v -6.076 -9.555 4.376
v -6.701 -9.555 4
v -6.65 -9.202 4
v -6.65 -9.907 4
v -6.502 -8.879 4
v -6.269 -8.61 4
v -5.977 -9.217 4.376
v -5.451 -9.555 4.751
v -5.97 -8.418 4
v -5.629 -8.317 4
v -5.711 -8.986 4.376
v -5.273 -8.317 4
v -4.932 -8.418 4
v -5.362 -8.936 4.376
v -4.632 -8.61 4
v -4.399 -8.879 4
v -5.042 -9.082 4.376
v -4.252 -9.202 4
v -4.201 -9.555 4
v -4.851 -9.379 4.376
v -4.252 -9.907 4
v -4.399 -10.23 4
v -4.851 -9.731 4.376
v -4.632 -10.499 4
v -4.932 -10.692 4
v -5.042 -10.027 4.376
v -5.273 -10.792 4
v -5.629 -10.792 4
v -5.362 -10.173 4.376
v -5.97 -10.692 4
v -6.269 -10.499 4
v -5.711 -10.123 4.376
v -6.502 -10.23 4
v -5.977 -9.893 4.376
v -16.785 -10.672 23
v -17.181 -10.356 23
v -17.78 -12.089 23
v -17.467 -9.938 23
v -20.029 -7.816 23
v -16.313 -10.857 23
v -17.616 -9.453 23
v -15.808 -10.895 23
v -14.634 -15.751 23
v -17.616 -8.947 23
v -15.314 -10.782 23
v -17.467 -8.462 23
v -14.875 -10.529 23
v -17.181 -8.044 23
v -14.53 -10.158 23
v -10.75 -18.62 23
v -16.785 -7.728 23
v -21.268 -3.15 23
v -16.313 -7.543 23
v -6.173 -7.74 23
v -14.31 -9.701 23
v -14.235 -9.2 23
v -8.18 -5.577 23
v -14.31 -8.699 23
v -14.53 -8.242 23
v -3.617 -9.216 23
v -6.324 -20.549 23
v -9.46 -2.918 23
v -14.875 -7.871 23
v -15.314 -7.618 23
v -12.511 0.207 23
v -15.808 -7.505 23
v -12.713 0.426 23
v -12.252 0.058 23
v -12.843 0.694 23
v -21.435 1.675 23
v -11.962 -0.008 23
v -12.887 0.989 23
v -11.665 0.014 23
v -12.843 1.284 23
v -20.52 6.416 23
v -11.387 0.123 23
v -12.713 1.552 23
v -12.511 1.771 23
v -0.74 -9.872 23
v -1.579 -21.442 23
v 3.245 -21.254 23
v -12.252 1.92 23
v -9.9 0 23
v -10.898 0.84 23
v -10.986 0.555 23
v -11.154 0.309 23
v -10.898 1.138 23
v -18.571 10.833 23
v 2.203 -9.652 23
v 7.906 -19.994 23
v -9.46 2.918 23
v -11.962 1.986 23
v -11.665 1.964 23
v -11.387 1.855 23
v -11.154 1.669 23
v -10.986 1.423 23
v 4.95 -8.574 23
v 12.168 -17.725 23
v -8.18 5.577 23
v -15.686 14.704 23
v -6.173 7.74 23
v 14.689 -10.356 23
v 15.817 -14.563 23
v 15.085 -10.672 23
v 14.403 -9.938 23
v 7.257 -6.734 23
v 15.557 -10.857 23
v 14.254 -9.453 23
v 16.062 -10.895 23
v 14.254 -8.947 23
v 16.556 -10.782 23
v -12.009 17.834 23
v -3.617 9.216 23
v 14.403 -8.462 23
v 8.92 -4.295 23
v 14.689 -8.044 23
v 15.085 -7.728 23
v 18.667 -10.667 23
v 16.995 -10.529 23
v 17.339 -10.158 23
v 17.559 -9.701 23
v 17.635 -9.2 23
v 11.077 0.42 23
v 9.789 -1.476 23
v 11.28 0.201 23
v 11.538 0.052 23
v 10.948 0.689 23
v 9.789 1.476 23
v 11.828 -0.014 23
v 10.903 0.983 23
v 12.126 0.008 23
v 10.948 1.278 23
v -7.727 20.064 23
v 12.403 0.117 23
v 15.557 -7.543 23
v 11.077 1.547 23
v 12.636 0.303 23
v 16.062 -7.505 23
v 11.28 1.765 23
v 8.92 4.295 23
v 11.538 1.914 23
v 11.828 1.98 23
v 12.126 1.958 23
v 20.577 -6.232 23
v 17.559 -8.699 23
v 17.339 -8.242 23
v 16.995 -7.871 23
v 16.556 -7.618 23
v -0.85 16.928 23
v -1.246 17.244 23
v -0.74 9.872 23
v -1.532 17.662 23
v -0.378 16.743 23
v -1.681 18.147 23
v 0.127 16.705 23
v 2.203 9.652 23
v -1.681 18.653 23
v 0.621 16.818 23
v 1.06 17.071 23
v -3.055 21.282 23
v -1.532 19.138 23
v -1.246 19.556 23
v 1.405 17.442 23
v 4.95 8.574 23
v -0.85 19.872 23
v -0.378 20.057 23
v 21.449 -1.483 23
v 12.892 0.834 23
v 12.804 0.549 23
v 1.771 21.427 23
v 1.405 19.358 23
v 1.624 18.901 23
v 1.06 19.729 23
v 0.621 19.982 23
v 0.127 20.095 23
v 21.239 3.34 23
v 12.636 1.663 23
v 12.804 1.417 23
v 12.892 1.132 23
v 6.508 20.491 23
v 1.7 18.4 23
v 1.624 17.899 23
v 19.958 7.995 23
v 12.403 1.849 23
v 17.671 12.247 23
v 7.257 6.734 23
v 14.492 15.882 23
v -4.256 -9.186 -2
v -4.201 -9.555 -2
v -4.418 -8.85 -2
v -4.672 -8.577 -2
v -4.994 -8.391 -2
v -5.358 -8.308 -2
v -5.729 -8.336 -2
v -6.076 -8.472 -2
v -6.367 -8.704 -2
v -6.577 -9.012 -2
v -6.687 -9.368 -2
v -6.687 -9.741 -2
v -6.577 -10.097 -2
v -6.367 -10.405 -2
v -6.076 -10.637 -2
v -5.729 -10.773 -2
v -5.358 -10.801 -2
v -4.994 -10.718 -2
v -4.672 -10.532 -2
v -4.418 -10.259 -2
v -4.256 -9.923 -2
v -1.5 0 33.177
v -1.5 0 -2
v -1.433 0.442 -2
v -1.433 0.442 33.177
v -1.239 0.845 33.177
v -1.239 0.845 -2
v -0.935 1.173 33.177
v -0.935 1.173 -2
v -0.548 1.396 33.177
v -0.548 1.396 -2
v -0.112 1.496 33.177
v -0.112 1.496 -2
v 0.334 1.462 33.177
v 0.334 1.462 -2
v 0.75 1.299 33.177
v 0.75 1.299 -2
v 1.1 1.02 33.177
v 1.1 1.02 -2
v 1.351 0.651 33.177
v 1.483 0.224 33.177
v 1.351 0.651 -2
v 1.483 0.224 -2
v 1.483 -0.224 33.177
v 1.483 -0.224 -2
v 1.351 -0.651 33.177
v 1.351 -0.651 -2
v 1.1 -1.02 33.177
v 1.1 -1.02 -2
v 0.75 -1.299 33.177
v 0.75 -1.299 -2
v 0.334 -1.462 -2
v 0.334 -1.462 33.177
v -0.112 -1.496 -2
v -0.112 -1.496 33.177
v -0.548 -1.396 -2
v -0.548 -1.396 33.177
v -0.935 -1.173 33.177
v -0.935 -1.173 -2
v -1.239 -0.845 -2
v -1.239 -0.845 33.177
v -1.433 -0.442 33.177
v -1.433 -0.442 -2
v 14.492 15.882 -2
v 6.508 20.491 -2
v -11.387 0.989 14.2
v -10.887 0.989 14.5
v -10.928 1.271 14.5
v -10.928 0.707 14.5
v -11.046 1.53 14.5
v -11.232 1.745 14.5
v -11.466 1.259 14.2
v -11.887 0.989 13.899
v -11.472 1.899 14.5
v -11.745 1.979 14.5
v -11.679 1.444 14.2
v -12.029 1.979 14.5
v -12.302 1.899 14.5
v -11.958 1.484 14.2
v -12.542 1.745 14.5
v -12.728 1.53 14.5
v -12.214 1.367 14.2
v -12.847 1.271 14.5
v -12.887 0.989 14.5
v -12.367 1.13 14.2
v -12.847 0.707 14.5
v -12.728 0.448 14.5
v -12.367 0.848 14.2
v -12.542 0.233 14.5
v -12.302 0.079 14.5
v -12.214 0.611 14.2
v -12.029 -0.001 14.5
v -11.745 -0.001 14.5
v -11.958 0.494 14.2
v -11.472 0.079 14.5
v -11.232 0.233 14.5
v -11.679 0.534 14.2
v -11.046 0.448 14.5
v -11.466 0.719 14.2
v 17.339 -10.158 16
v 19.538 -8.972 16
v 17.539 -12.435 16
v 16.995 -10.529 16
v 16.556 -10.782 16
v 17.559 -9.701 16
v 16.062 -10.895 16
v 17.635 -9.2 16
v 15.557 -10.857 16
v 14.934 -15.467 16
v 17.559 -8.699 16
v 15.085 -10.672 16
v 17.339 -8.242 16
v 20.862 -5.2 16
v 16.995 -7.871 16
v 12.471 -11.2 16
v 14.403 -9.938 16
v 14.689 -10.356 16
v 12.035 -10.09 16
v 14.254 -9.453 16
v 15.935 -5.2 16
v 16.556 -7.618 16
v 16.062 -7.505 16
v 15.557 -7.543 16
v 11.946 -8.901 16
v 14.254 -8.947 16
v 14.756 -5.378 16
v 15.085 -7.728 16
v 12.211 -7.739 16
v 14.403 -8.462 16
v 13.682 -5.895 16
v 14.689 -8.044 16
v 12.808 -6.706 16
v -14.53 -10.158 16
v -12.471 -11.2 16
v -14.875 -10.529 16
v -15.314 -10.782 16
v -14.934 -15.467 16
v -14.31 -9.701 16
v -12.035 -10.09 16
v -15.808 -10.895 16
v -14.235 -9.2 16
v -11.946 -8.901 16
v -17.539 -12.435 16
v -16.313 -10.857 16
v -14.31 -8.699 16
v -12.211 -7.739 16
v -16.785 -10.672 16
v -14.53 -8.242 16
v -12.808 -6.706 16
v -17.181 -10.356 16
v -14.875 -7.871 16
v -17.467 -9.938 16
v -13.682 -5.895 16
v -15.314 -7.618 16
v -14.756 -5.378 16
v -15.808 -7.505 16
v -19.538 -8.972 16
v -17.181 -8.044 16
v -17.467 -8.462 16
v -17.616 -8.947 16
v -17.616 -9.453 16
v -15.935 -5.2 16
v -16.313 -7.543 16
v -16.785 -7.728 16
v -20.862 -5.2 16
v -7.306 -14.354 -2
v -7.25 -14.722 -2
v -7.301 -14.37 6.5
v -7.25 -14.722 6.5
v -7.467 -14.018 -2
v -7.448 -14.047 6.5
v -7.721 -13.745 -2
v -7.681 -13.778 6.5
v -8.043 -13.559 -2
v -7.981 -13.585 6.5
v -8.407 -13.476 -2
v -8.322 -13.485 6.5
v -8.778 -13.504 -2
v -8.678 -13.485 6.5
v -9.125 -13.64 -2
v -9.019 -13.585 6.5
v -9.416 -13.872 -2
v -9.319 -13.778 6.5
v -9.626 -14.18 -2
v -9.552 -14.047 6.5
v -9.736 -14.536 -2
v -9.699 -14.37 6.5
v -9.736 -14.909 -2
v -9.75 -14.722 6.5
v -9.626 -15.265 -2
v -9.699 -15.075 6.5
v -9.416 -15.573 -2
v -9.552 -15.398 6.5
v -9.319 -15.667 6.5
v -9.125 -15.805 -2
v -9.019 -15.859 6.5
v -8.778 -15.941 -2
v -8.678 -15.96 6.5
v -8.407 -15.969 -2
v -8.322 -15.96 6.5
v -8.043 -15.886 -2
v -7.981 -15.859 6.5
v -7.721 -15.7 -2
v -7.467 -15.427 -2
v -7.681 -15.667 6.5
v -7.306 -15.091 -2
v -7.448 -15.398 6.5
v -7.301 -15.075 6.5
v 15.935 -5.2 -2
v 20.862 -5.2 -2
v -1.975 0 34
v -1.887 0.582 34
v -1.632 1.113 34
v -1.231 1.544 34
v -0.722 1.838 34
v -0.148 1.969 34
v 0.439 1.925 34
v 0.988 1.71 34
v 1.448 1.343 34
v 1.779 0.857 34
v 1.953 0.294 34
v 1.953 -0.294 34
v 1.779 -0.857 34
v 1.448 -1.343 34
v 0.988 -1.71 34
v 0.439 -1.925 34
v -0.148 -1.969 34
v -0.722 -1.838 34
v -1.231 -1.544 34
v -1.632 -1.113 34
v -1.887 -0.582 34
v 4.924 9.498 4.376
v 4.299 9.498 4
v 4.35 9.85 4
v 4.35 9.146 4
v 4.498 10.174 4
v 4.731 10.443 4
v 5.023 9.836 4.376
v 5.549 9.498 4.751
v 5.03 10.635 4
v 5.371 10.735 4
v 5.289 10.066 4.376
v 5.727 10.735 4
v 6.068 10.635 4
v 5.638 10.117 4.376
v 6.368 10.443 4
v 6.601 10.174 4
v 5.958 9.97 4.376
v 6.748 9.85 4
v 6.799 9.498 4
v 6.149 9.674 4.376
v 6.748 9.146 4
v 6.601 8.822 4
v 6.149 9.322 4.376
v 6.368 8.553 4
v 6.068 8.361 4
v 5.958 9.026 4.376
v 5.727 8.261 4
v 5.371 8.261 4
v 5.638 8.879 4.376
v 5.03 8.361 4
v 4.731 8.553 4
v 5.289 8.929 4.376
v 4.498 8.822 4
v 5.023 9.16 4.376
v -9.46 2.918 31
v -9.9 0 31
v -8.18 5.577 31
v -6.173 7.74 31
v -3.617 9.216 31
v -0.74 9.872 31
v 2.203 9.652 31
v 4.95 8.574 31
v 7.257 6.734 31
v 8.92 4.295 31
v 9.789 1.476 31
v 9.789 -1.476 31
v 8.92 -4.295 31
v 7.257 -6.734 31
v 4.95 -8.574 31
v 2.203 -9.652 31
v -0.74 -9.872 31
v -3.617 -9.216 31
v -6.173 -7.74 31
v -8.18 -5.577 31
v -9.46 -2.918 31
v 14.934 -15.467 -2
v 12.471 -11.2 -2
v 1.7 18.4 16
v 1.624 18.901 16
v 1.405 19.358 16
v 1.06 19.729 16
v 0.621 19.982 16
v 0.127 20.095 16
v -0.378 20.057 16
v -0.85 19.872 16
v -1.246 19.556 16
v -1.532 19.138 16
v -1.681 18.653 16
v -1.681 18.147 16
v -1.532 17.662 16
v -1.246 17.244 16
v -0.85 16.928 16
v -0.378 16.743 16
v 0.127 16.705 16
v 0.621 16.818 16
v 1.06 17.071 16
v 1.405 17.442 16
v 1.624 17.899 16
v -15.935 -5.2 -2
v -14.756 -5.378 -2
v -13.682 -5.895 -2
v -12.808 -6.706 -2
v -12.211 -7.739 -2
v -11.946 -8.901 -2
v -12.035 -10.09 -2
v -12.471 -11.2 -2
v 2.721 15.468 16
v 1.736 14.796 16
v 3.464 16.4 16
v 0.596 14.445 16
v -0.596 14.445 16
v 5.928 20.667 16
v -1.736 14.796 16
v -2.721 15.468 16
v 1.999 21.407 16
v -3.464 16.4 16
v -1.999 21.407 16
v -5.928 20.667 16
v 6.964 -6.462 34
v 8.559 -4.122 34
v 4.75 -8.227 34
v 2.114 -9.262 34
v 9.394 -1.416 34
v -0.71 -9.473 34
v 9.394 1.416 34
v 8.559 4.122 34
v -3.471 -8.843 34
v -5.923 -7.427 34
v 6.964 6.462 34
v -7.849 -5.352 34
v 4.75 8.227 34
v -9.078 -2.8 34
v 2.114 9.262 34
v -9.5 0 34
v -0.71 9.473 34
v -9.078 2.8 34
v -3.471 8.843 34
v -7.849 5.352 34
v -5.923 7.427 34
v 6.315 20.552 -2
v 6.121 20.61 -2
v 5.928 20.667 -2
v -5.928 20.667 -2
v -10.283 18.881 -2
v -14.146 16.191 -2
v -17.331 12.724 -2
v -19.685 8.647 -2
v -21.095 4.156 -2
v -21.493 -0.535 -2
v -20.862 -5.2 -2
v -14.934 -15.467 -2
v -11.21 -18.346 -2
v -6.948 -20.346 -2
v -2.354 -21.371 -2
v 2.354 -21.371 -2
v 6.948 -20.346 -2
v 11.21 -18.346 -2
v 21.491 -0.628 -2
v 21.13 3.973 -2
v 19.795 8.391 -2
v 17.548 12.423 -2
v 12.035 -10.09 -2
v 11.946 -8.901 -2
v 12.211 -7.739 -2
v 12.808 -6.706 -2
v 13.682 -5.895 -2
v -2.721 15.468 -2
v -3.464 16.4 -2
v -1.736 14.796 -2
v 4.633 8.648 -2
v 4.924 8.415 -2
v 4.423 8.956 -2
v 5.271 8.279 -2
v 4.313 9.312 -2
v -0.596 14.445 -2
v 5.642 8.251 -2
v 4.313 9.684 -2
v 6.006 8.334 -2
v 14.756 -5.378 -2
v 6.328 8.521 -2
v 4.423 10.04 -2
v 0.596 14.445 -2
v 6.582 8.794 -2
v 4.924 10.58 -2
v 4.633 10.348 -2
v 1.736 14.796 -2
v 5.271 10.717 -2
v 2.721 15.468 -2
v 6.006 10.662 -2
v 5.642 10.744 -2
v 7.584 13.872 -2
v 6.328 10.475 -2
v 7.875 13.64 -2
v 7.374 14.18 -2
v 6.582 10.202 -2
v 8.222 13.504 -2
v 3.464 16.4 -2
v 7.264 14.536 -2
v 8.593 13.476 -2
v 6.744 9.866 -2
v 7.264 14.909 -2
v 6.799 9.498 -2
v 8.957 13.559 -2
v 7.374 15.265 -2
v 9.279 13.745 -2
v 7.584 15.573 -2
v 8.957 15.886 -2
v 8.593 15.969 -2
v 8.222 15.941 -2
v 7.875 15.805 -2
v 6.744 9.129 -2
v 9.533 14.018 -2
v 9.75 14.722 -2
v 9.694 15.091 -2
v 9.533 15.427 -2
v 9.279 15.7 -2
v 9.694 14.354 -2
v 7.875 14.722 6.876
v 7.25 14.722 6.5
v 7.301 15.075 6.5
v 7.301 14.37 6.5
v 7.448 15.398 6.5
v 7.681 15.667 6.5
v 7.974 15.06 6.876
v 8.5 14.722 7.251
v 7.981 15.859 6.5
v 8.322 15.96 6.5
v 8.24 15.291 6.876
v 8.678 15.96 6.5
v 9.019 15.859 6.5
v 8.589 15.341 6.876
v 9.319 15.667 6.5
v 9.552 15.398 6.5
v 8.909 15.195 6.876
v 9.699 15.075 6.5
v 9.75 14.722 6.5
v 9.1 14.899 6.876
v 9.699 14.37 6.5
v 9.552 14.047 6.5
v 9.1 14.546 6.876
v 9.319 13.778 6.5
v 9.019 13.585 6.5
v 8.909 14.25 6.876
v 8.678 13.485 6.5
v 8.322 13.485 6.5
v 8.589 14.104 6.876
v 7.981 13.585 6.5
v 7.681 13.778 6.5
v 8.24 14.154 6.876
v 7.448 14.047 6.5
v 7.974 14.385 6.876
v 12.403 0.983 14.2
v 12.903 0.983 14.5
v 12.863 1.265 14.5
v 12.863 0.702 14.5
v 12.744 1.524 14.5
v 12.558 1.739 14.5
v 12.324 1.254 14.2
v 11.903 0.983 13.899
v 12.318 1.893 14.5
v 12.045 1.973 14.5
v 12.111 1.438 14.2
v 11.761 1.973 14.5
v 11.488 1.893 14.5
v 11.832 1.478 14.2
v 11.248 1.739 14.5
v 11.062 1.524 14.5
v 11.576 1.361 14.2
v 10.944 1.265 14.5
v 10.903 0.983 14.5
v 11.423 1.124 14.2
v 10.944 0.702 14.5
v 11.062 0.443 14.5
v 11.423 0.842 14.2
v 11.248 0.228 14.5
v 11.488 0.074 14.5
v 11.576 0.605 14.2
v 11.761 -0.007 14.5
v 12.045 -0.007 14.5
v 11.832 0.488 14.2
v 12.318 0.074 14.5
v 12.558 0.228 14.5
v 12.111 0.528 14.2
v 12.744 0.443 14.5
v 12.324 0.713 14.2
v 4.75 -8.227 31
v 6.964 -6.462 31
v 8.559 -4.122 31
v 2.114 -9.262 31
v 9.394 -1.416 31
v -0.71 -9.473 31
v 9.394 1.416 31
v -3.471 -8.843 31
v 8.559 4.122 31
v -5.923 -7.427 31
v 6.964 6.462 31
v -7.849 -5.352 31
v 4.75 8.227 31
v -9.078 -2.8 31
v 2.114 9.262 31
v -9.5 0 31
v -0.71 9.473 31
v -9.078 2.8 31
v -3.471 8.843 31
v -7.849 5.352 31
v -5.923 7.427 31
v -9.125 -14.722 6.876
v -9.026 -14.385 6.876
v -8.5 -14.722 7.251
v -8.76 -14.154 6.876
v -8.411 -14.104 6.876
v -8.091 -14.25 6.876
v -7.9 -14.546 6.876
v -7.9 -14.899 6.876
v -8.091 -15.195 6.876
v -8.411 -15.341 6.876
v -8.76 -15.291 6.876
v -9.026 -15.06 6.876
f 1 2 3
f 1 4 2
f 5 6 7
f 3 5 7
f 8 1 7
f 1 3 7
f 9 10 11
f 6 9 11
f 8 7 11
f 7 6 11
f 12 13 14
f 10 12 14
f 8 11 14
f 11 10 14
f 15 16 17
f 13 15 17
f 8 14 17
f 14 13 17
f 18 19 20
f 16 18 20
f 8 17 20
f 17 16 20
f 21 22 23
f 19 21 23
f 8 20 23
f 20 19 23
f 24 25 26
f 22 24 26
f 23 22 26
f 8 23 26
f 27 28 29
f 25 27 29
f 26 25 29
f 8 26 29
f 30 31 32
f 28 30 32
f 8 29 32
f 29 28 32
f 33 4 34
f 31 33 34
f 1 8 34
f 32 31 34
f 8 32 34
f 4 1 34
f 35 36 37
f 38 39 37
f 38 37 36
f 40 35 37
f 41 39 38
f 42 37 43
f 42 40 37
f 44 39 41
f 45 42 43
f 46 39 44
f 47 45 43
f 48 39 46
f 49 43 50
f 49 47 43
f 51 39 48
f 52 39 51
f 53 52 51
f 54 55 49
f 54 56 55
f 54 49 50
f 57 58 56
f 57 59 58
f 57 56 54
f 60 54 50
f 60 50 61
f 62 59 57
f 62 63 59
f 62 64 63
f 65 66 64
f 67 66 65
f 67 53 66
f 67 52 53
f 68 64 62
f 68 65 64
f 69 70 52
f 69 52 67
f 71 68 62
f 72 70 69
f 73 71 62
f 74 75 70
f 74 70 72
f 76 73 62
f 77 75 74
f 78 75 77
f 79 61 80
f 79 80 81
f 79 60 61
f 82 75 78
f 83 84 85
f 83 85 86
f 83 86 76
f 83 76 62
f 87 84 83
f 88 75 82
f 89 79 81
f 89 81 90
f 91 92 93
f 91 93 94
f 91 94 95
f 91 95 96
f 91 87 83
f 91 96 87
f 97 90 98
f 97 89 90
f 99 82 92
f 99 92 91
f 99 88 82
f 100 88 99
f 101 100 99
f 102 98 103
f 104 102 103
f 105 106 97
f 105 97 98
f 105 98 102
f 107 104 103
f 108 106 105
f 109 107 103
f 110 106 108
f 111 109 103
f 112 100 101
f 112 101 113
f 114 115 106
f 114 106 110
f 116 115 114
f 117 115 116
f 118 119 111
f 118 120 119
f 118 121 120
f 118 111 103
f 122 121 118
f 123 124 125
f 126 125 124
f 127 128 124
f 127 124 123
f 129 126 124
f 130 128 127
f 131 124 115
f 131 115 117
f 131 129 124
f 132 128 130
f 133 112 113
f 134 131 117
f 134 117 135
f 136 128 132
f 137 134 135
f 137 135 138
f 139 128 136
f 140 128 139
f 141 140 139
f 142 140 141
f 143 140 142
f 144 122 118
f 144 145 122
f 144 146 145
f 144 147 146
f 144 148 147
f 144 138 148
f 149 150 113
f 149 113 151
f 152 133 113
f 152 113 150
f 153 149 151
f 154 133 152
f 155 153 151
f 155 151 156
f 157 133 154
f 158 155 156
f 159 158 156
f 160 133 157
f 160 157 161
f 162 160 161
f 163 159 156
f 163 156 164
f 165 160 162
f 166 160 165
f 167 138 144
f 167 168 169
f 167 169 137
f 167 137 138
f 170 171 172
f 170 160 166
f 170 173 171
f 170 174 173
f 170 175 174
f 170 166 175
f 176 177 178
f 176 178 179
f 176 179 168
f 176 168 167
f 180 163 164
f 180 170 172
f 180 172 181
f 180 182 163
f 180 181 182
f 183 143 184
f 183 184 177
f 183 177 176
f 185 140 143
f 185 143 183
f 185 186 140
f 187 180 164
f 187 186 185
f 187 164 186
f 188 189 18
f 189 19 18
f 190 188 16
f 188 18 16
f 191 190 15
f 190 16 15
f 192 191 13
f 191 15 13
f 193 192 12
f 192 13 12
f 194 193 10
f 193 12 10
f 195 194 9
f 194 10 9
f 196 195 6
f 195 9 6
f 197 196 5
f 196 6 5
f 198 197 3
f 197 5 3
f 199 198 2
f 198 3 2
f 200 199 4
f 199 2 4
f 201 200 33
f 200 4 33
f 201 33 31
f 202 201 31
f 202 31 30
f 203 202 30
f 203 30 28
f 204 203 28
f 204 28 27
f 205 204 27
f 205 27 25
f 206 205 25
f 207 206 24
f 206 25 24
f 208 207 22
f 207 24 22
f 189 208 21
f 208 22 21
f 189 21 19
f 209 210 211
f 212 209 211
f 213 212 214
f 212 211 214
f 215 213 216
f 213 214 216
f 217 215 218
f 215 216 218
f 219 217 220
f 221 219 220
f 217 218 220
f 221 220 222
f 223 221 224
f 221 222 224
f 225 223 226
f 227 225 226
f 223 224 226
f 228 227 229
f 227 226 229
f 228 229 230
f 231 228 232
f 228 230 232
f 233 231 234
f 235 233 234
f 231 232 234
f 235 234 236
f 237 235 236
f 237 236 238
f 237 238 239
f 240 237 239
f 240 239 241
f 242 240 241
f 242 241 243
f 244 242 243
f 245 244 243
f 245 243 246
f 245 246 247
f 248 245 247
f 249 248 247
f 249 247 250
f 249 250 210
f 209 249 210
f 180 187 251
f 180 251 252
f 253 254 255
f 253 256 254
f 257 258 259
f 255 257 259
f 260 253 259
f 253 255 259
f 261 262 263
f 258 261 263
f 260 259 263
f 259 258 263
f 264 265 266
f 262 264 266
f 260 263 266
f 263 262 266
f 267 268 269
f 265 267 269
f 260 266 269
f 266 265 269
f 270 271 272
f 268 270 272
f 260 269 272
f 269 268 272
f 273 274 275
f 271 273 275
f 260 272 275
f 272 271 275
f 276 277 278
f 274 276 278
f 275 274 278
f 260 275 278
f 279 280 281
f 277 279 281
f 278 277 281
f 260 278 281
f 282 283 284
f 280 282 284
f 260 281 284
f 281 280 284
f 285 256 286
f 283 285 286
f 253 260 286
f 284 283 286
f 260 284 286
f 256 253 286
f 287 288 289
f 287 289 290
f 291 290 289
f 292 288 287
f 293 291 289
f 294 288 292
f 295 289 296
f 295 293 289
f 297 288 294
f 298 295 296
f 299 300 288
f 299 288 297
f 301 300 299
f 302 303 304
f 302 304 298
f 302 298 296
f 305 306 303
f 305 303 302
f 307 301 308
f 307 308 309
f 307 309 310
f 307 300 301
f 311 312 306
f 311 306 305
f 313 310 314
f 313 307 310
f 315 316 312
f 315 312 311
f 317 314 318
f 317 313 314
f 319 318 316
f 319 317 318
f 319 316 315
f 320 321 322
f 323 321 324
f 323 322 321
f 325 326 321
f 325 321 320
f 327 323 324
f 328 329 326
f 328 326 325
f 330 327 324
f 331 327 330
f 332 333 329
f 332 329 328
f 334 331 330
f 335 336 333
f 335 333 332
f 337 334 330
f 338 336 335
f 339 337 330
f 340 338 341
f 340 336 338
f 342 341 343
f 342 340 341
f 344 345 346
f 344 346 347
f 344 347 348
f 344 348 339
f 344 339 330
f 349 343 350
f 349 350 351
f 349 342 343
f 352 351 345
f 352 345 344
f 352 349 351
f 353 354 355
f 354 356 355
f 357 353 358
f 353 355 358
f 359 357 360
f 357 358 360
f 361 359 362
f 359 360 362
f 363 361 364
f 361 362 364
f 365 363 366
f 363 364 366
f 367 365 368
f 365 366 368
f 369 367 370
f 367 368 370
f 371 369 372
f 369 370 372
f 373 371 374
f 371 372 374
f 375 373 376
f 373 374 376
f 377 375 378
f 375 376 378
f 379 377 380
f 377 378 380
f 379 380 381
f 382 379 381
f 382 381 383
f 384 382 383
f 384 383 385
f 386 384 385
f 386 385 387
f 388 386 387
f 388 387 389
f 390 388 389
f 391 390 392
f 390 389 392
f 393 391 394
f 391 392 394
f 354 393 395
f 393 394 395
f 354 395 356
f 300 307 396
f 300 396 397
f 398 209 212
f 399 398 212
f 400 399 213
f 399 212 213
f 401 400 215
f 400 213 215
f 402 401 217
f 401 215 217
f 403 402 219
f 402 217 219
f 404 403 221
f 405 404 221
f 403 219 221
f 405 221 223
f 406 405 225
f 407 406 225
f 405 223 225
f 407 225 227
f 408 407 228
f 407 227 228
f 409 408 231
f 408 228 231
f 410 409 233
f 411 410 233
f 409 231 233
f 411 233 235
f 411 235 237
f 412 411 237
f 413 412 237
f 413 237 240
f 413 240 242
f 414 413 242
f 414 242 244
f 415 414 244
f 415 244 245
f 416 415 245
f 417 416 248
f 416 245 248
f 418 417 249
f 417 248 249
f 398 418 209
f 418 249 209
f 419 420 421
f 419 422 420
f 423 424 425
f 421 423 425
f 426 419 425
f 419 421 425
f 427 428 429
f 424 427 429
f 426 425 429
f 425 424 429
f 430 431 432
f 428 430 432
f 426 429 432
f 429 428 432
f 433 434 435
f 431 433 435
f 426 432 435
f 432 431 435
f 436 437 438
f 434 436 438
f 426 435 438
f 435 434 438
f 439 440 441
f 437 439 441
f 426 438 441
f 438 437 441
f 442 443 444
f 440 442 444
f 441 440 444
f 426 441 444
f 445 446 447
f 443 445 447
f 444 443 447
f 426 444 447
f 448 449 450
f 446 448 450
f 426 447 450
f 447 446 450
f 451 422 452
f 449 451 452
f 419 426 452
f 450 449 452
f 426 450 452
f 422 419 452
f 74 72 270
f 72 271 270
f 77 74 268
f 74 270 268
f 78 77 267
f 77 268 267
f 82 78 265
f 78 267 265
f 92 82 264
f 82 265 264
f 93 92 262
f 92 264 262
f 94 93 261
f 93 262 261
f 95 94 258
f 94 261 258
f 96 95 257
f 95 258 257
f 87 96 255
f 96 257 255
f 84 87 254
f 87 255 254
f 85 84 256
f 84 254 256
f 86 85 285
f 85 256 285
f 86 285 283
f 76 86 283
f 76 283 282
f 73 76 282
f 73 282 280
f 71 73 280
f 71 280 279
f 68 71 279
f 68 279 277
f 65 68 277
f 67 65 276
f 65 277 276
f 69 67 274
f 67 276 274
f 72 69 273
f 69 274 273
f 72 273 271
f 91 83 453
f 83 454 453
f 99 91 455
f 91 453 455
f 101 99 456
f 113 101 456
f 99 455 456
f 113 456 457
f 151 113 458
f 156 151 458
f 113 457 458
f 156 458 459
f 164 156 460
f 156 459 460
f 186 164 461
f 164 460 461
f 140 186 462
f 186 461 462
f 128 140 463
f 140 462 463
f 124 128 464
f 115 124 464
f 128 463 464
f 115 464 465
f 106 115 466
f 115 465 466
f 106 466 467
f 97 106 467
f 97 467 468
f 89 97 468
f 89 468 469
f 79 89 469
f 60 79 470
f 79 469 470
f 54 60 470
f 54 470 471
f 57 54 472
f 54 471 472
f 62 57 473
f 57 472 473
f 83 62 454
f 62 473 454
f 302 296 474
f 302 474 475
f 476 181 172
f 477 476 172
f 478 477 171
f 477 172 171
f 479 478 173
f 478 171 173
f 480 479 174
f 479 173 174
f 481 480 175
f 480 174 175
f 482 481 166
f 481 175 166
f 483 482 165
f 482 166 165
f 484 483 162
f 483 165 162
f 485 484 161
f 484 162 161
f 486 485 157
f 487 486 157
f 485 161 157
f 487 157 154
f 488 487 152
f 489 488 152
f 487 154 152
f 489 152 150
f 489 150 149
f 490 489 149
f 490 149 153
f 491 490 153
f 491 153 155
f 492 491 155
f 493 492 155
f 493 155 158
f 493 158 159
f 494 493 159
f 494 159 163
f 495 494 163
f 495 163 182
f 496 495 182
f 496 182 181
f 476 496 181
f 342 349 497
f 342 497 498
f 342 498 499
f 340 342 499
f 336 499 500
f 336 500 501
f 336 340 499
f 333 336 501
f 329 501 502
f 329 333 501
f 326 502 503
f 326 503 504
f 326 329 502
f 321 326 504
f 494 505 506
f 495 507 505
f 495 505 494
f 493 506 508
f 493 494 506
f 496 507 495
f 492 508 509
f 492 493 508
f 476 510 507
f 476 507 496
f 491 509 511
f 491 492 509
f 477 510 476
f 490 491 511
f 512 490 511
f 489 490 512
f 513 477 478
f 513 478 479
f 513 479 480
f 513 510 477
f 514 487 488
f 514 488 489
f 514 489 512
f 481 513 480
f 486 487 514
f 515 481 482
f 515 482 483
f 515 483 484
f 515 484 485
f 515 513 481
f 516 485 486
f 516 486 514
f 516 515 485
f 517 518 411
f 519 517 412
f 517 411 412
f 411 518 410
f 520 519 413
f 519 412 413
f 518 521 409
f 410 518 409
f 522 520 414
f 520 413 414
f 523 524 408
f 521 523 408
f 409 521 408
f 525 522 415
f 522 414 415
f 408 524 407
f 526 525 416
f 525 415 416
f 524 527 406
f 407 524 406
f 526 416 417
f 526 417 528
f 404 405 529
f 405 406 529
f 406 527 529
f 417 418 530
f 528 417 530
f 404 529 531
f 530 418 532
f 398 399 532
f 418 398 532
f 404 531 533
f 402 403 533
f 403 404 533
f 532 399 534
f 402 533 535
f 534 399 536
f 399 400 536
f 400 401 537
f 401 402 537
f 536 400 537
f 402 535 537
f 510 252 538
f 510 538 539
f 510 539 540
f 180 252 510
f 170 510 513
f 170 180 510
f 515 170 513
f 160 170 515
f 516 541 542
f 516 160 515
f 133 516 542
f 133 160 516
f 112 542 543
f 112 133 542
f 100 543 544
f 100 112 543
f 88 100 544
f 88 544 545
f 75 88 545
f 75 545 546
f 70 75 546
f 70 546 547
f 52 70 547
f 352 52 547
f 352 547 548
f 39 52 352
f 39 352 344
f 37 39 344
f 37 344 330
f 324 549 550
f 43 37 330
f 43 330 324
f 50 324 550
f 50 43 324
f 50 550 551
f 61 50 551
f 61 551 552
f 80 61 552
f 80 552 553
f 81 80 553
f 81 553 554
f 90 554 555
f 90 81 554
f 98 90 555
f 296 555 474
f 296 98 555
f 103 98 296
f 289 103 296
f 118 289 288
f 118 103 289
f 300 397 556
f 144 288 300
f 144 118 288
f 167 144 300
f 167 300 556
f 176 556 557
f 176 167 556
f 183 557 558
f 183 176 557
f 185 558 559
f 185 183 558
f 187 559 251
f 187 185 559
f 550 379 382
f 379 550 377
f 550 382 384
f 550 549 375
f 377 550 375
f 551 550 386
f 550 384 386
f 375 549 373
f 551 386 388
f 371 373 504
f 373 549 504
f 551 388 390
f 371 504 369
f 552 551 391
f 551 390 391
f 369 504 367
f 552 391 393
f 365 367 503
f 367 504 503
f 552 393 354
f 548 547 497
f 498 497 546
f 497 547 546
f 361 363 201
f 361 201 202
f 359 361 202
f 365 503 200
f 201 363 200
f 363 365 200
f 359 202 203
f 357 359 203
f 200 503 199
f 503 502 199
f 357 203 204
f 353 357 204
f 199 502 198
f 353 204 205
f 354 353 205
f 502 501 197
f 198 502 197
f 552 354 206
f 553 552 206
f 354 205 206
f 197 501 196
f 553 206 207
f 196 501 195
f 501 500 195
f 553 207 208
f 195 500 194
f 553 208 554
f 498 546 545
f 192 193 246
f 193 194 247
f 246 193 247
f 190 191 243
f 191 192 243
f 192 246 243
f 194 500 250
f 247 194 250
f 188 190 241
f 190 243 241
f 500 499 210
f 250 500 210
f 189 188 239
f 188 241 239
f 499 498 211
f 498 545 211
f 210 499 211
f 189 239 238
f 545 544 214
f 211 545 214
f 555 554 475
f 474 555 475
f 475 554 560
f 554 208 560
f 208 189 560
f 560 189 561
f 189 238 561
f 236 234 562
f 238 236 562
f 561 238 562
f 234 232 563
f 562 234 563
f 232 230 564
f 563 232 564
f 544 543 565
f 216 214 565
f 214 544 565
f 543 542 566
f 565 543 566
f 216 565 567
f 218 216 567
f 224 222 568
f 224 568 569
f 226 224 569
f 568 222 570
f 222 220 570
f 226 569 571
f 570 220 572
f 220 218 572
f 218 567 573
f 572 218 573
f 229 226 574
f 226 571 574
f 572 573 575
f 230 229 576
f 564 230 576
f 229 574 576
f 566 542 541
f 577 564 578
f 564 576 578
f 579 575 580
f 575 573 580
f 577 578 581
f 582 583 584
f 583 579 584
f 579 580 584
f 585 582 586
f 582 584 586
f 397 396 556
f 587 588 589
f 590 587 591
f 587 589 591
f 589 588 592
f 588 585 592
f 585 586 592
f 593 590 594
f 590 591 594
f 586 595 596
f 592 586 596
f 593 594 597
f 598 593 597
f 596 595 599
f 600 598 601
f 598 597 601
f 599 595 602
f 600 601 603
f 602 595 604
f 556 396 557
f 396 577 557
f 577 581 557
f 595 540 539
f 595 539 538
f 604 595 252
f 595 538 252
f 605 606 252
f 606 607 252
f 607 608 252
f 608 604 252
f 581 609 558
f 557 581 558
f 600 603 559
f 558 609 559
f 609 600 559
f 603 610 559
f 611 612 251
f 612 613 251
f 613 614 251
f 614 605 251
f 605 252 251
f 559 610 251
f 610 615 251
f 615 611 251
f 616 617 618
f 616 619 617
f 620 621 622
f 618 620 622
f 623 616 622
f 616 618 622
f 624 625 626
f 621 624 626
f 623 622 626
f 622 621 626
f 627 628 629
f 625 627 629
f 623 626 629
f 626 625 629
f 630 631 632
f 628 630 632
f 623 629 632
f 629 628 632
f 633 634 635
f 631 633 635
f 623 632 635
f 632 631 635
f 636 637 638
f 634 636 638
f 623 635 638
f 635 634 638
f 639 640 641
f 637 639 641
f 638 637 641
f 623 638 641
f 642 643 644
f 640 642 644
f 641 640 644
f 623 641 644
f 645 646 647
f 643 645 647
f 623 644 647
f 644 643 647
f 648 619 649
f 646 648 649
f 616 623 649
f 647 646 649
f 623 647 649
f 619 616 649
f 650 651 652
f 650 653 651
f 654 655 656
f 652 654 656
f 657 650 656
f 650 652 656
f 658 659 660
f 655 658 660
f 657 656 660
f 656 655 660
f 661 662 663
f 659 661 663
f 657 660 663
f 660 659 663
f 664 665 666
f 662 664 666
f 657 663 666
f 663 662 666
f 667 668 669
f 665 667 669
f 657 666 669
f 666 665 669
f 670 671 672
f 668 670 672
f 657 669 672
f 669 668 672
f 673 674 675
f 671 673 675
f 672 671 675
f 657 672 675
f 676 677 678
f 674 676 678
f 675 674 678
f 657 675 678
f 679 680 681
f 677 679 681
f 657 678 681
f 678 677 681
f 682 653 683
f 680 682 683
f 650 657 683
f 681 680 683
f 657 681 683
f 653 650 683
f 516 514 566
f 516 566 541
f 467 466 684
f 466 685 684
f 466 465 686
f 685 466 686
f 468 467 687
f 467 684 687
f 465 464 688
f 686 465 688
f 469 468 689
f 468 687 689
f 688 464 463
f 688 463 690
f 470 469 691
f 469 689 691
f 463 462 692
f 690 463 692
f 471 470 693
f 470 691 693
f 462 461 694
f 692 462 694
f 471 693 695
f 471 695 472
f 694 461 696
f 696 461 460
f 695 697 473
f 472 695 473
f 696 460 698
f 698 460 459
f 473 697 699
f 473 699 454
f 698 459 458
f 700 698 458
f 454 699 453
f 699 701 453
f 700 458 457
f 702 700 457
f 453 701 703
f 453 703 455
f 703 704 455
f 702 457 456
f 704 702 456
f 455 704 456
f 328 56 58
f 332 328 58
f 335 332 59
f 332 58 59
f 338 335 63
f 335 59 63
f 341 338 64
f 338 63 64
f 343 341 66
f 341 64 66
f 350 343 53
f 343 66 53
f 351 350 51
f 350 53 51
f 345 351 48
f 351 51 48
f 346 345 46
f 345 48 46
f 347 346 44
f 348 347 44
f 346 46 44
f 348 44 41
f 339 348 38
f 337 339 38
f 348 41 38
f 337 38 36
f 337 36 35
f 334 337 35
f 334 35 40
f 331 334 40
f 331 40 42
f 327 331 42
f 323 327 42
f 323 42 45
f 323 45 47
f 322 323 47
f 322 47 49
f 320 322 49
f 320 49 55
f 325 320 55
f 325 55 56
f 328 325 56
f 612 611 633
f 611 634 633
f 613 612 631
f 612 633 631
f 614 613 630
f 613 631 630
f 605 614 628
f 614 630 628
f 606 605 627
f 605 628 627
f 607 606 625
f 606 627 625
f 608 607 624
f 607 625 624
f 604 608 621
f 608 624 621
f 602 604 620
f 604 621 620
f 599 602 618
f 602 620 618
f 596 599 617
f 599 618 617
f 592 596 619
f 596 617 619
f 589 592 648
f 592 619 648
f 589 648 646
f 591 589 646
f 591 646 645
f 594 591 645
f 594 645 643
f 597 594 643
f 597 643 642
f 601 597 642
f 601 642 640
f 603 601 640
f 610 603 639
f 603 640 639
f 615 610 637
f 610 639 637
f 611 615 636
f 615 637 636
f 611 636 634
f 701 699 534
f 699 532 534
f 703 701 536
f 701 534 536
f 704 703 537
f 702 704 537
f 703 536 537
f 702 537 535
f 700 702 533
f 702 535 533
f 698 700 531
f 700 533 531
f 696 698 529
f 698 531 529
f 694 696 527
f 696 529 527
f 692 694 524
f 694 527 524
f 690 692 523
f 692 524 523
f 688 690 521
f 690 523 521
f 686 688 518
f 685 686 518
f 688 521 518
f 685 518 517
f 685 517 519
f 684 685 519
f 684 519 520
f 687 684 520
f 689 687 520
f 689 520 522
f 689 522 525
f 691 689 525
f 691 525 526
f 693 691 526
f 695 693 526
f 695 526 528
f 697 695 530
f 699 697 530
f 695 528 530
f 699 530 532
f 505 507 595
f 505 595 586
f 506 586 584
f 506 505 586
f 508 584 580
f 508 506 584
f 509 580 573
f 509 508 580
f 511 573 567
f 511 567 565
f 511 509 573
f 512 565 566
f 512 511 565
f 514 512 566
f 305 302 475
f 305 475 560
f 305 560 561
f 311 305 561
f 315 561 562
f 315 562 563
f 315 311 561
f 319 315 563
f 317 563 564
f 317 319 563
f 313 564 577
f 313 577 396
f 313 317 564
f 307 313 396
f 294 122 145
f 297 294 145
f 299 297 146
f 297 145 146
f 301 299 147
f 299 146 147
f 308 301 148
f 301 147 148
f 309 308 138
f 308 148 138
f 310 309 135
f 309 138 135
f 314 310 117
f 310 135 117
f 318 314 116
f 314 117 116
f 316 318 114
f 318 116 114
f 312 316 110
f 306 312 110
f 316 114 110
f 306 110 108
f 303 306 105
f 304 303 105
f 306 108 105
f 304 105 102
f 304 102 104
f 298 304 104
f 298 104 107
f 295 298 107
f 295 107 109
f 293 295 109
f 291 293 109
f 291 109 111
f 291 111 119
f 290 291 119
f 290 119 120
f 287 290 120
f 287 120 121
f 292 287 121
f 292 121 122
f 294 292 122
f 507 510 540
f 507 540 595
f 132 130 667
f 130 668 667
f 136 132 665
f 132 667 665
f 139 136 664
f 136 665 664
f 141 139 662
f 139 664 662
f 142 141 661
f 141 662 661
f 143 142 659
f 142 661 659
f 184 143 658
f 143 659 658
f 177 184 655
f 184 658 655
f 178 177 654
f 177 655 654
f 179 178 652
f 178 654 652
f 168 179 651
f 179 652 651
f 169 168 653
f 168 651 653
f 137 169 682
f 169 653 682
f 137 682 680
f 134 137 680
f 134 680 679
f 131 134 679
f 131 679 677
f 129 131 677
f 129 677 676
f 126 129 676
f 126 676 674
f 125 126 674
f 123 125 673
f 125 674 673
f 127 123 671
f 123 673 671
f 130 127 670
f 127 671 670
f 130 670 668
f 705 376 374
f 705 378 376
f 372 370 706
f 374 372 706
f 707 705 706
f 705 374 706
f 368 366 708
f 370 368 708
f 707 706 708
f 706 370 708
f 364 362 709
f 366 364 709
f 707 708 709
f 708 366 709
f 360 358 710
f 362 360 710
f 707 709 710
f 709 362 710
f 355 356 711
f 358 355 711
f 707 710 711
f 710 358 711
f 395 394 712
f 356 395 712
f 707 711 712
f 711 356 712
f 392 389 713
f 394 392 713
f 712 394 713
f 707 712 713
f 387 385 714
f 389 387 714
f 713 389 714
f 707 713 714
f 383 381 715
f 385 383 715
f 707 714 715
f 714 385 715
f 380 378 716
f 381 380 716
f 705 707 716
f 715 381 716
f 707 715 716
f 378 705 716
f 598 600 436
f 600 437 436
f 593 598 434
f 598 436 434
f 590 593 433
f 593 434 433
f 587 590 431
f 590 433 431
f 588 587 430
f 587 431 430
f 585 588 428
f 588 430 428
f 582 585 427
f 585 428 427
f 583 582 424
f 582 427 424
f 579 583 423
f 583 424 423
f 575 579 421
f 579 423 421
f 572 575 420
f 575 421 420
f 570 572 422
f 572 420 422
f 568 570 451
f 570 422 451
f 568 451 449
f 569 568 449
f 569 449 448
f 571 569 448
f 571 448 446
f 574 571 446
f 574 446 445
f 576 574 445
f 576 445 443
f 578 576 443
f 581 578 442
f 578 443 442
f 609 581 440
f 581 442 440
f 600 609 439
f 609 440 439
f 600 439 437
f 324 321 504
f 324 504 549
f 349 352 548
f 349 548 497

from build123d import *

# Parameters (mm, degrees)
AUFSATZ_LINEAR_AUSTRAGEN1_DEPTH      = 25
SCHNITT_LINEAR_START                 = -18
SCHNITT_LINEAR_AUSTRAGEN1_DEPTH      = 18
SCHNITT_LINEAR_AUSTRAGEN2_DEPTH      = 18
SCHNITT_LINEAR_AUSTRAGEN3_DEPTH      = 18
F_3_4_3_4_DURCHMESSER_BOHRUNG1_D     = 3.4
F_3_4_3_4_DURCHMESSER_BOHRUNG1_DEPTH = 18
F_3_0_3_DURCHMESSER_BOHRUNG2_D       = 3
FASE1_SIZE                           = 0.475
FASE1_SIZE2                          = 0.822724134
M3_GEWINDEBOHRUNG1_D                 = 2.5
M3_GEWINDEBOHRUNG1_DEPTH             = 8.5
M3_GEWINDEBOHRUNG1_TIP               = 0.751075774
F_2_5_2_5_DURCHMESSER_BOHRUNG4_D     = 2.5
F_2_5_2_5_DURCHMESSER_BOHRUNG4_DEPTH = 6
F_2_5_2_5_DURCHMESSER_BOHRUNG4_TIP   = 0.751075774
F_2_0MM_STIFTLOCH1_D                 = 2
F_2_0MM_STIFTLOCH1_DEPTH             = 8.5
F_2_0MM_STIFTLOCH1_TIP               = 0.600860619


with BuildPart() as part:
    # Skizze1 → Aufsatz-Linear austragen1 (new body)
    with BuildSketch(Plane.XY.offset(23)):
        with BuildLine():
            Line((14.492179856, 15.881647365), (6.507820144, 20.491419594))
            ThreePointArc((6.507820144, 20.491419594), (-10.75, -18.619546181), (14.492179856, 15.881647365))
        make_face()
    extrude(amount=-AUFSATZ_LINEAR_AUSTRAGEN1_DEPTH)

    # Skizze2 → Schnitt-Linear austragen1 (cut)
    with BuildSketch(Plane(origin=(0, 0, -2), x_dir=(-1, 0, 0), z_dir=(0, 0, -1)).offset(SCHNITT_LINEAR_START)):
        with BuildLine():
            Line((3.464101615, 16.4), (5.927511586, 20.66675123))
            ThreePointArc((5.927511586, 20.66675123), (0, 21.5), (-5.927511586, 20.66675123))
            Line((-5.927511586, 20.66675123), (-3.464101615, 16.4))
            ThreePointArc((-3.464101615, 16.4), (0, 14.4), (3.464101615, 16.4))
        make_face()
    extrude(amount=SCHNITT_LINEAR_AUSTRAGEN1_DEPTH, mode=Mode.SUBTRACT)

    # Skizze3 → Schnitt-Linear austragen2 (cut)
    with BuildSketch(Plane(origin=(0, 0, -2), x_dir=(-1, 0, 0), z_dir=(0, 0, -1)).offset(SCHNITT_LINEAR_START)):
        with BuildLine():
            Line((12.470765815, -11.2), (14.934175786, -15.46675123))
            ThreePointArc((14.934175786, -15.46675123), (18.619546181, -10.75), (20.861687372, -5.2))
            Line((20.861687372, -5.2), (15.93486743, -5.2))
            ThreePointArc((15.93486743, -5.2), (12.470765815, -7.2), (12.470765815, -11.2))
        make_face()
    extrude(amount=SCHNITT_LINEAR_AUSTRAGEN2_DEPTH, mode=Mode.SUBTRACT)

    # Skizze4 → Schnitt-Linear austragen3 (cut)
    with BuildSketch(Plane(origin=(0, 0, -2), x_dir=(-1, 0, 0), z_dir=(0, 0, -1)).offset(SCHNITT_LINEAR_START)):
        with BuildLine():
            Line((-15.93486743, -5.2), (-20.861687372, -5.2))
            ThreePointArc((-20.861687372, -5.2), (-18.619546181, -10.75), (-14.934175786, -15.46675123))
            Line((-14.934175786, -15.46675123), (-12.470765815, -11.2))
            ThreePointArc((-12.470765815, -11.2), (-12.470765815, -7.2), (-15.93486743, -5.2))
        make_face()
    extrude(amount=SCHNITT_LINEAR_AUSTRAGEN3_DEPTH, mode=Mode.SUBTRACT)

    # Skizze7 → Rotation1 (revolve)
    with BuildSketch(Plane.XZ, mode=Mode.PRIVATE) as rotation1_sk:
        Polygon((9.5, 34), (0, 34), (0, 23), (9.9, 23), (9.9, 31), (9.5, 31), align=None)
    revolve(rotation1_sk.sketch.rotate(Axis((0, 0, 34), (0, 0, -1)), 180), axis=Axis((0, 0, 34), (0, 0, -1)))

    # Ø3.4 (3.4) Durchmesser Bohrung1
    with Locations(Plane(origin=(0, 0, 16), x_dir=(-1, 0, 0), z_dir=(0, 0, -1))):
        with Locations((0, 18.4), (15.93486743, -9.2), (-15.93486743, -9.2)):
            Hole(F_3_4_3_4_DURCHMESSER_BOHRUNG1_D / 2, depth=F_3_4_3_4_DURCHMESSER_BOHRUNG1_DEPTH)

    # Ø3.0 (3) Durchmesser Bohrung2 (through all)
    with Locations(Plane.XY.offset(34)):
        with Locations((0, 0)):
            Hole(F_3_0_3_DURCHMESSER_BOHRUNG2_D / 2)

    # Fase1
    fase1_edges = [part.edges().sort_by_distance(p)[0] for p in [
        (1.5, 0, 34),
    ]]
    fase1_side = [part.faces().sort_by_distance(p)[0] for p in [
        (9.231299423, 0, 34),
    ]]
    chamfer(fase1_edges, length=FASE1_SIZE, length2=FASE1_SIZE2, reference=fase1_side[0])

    # M3 Gewindebohrung1
    with Locations(Plane(origin=(0, 0, -2), x_dir=(-1, 0, 0), z_dir=(0, 0, -1))):
        with Locations((-8.5, 14.722431864), (8.5, -14.722431864)):
            Hole(M3_GEWINDEBOHRUNG1_D / 2, depth=M3_GEWINDEBOHRUNG1_DEPTH)
            with Locations((0, 0, -(M3_GEWINDEBOHRUNG1_DEPTH + M3_GEWINDEBOHRUNG1_TIP / 2))):  # 118° drill point
                Cone(0, M3_GEWINDEBOHRUNG1_D / 2, M3_GEWINDEBOHRUNG1_TIP, mode=Mode.SUBTRACT)

    # Ø2.5 (2.5) Durchmesser Bohrung4
    with Locations(Plane(origin=(0, 0, -2), x_dir=(-1, 0, 0), z_dir=(0, 0, -1))):
        with Locations((-5.549084958, 9.497940228), (5.450915042, -9.554618655)):
            Hole(F_2_5_2_5_DURCHMESSER_BOHRUNG4_D / 2, depth=F_2_5_2_5_DURCHMESSER_BOHRUNG4_DEPTH)
            with Locations((0, 0, -(F_2_5_2_5_DURCHMESSER_BOHRUNG4_DEPTH + F_2_5_2_5_DURCHMESSER_BOHRUNG4_TIP / 2))):  # 118° drill point
                Cone(0, F_2_5_2_5_DURCHMESSER_BOHRUNG4_D / 2, F_2_5_2_5_DURCHMESSER_BOHRUNG4_TIP, mode=Mode.SUBTRACT)

    # Ø2.0mm Stiftloch1
    with Locations(Plane.XY.offset(23)):
        with Locations((-11.887048957, 0.988972746), (11.903074361, 0.983270441)):
            Hole(F_2_0MM_STIFTLOCH1_D / 2, depth=F_2_0MM_STIFTLOCH1_DEPTH)
            with Locations((0, 0, -(F_2_0MM_STIFTLOCH1_DEPTH + F_2_0MM_STIFTLOCH1_TIP / 2))):  # 118° drill point
                Cone(0, F_2_0MM_STIFTLOCH1_D / 2, F_2_0MM_STIFTLOCH1_TIP, mode=Mode.SUBTRACT)


solid = part.part
